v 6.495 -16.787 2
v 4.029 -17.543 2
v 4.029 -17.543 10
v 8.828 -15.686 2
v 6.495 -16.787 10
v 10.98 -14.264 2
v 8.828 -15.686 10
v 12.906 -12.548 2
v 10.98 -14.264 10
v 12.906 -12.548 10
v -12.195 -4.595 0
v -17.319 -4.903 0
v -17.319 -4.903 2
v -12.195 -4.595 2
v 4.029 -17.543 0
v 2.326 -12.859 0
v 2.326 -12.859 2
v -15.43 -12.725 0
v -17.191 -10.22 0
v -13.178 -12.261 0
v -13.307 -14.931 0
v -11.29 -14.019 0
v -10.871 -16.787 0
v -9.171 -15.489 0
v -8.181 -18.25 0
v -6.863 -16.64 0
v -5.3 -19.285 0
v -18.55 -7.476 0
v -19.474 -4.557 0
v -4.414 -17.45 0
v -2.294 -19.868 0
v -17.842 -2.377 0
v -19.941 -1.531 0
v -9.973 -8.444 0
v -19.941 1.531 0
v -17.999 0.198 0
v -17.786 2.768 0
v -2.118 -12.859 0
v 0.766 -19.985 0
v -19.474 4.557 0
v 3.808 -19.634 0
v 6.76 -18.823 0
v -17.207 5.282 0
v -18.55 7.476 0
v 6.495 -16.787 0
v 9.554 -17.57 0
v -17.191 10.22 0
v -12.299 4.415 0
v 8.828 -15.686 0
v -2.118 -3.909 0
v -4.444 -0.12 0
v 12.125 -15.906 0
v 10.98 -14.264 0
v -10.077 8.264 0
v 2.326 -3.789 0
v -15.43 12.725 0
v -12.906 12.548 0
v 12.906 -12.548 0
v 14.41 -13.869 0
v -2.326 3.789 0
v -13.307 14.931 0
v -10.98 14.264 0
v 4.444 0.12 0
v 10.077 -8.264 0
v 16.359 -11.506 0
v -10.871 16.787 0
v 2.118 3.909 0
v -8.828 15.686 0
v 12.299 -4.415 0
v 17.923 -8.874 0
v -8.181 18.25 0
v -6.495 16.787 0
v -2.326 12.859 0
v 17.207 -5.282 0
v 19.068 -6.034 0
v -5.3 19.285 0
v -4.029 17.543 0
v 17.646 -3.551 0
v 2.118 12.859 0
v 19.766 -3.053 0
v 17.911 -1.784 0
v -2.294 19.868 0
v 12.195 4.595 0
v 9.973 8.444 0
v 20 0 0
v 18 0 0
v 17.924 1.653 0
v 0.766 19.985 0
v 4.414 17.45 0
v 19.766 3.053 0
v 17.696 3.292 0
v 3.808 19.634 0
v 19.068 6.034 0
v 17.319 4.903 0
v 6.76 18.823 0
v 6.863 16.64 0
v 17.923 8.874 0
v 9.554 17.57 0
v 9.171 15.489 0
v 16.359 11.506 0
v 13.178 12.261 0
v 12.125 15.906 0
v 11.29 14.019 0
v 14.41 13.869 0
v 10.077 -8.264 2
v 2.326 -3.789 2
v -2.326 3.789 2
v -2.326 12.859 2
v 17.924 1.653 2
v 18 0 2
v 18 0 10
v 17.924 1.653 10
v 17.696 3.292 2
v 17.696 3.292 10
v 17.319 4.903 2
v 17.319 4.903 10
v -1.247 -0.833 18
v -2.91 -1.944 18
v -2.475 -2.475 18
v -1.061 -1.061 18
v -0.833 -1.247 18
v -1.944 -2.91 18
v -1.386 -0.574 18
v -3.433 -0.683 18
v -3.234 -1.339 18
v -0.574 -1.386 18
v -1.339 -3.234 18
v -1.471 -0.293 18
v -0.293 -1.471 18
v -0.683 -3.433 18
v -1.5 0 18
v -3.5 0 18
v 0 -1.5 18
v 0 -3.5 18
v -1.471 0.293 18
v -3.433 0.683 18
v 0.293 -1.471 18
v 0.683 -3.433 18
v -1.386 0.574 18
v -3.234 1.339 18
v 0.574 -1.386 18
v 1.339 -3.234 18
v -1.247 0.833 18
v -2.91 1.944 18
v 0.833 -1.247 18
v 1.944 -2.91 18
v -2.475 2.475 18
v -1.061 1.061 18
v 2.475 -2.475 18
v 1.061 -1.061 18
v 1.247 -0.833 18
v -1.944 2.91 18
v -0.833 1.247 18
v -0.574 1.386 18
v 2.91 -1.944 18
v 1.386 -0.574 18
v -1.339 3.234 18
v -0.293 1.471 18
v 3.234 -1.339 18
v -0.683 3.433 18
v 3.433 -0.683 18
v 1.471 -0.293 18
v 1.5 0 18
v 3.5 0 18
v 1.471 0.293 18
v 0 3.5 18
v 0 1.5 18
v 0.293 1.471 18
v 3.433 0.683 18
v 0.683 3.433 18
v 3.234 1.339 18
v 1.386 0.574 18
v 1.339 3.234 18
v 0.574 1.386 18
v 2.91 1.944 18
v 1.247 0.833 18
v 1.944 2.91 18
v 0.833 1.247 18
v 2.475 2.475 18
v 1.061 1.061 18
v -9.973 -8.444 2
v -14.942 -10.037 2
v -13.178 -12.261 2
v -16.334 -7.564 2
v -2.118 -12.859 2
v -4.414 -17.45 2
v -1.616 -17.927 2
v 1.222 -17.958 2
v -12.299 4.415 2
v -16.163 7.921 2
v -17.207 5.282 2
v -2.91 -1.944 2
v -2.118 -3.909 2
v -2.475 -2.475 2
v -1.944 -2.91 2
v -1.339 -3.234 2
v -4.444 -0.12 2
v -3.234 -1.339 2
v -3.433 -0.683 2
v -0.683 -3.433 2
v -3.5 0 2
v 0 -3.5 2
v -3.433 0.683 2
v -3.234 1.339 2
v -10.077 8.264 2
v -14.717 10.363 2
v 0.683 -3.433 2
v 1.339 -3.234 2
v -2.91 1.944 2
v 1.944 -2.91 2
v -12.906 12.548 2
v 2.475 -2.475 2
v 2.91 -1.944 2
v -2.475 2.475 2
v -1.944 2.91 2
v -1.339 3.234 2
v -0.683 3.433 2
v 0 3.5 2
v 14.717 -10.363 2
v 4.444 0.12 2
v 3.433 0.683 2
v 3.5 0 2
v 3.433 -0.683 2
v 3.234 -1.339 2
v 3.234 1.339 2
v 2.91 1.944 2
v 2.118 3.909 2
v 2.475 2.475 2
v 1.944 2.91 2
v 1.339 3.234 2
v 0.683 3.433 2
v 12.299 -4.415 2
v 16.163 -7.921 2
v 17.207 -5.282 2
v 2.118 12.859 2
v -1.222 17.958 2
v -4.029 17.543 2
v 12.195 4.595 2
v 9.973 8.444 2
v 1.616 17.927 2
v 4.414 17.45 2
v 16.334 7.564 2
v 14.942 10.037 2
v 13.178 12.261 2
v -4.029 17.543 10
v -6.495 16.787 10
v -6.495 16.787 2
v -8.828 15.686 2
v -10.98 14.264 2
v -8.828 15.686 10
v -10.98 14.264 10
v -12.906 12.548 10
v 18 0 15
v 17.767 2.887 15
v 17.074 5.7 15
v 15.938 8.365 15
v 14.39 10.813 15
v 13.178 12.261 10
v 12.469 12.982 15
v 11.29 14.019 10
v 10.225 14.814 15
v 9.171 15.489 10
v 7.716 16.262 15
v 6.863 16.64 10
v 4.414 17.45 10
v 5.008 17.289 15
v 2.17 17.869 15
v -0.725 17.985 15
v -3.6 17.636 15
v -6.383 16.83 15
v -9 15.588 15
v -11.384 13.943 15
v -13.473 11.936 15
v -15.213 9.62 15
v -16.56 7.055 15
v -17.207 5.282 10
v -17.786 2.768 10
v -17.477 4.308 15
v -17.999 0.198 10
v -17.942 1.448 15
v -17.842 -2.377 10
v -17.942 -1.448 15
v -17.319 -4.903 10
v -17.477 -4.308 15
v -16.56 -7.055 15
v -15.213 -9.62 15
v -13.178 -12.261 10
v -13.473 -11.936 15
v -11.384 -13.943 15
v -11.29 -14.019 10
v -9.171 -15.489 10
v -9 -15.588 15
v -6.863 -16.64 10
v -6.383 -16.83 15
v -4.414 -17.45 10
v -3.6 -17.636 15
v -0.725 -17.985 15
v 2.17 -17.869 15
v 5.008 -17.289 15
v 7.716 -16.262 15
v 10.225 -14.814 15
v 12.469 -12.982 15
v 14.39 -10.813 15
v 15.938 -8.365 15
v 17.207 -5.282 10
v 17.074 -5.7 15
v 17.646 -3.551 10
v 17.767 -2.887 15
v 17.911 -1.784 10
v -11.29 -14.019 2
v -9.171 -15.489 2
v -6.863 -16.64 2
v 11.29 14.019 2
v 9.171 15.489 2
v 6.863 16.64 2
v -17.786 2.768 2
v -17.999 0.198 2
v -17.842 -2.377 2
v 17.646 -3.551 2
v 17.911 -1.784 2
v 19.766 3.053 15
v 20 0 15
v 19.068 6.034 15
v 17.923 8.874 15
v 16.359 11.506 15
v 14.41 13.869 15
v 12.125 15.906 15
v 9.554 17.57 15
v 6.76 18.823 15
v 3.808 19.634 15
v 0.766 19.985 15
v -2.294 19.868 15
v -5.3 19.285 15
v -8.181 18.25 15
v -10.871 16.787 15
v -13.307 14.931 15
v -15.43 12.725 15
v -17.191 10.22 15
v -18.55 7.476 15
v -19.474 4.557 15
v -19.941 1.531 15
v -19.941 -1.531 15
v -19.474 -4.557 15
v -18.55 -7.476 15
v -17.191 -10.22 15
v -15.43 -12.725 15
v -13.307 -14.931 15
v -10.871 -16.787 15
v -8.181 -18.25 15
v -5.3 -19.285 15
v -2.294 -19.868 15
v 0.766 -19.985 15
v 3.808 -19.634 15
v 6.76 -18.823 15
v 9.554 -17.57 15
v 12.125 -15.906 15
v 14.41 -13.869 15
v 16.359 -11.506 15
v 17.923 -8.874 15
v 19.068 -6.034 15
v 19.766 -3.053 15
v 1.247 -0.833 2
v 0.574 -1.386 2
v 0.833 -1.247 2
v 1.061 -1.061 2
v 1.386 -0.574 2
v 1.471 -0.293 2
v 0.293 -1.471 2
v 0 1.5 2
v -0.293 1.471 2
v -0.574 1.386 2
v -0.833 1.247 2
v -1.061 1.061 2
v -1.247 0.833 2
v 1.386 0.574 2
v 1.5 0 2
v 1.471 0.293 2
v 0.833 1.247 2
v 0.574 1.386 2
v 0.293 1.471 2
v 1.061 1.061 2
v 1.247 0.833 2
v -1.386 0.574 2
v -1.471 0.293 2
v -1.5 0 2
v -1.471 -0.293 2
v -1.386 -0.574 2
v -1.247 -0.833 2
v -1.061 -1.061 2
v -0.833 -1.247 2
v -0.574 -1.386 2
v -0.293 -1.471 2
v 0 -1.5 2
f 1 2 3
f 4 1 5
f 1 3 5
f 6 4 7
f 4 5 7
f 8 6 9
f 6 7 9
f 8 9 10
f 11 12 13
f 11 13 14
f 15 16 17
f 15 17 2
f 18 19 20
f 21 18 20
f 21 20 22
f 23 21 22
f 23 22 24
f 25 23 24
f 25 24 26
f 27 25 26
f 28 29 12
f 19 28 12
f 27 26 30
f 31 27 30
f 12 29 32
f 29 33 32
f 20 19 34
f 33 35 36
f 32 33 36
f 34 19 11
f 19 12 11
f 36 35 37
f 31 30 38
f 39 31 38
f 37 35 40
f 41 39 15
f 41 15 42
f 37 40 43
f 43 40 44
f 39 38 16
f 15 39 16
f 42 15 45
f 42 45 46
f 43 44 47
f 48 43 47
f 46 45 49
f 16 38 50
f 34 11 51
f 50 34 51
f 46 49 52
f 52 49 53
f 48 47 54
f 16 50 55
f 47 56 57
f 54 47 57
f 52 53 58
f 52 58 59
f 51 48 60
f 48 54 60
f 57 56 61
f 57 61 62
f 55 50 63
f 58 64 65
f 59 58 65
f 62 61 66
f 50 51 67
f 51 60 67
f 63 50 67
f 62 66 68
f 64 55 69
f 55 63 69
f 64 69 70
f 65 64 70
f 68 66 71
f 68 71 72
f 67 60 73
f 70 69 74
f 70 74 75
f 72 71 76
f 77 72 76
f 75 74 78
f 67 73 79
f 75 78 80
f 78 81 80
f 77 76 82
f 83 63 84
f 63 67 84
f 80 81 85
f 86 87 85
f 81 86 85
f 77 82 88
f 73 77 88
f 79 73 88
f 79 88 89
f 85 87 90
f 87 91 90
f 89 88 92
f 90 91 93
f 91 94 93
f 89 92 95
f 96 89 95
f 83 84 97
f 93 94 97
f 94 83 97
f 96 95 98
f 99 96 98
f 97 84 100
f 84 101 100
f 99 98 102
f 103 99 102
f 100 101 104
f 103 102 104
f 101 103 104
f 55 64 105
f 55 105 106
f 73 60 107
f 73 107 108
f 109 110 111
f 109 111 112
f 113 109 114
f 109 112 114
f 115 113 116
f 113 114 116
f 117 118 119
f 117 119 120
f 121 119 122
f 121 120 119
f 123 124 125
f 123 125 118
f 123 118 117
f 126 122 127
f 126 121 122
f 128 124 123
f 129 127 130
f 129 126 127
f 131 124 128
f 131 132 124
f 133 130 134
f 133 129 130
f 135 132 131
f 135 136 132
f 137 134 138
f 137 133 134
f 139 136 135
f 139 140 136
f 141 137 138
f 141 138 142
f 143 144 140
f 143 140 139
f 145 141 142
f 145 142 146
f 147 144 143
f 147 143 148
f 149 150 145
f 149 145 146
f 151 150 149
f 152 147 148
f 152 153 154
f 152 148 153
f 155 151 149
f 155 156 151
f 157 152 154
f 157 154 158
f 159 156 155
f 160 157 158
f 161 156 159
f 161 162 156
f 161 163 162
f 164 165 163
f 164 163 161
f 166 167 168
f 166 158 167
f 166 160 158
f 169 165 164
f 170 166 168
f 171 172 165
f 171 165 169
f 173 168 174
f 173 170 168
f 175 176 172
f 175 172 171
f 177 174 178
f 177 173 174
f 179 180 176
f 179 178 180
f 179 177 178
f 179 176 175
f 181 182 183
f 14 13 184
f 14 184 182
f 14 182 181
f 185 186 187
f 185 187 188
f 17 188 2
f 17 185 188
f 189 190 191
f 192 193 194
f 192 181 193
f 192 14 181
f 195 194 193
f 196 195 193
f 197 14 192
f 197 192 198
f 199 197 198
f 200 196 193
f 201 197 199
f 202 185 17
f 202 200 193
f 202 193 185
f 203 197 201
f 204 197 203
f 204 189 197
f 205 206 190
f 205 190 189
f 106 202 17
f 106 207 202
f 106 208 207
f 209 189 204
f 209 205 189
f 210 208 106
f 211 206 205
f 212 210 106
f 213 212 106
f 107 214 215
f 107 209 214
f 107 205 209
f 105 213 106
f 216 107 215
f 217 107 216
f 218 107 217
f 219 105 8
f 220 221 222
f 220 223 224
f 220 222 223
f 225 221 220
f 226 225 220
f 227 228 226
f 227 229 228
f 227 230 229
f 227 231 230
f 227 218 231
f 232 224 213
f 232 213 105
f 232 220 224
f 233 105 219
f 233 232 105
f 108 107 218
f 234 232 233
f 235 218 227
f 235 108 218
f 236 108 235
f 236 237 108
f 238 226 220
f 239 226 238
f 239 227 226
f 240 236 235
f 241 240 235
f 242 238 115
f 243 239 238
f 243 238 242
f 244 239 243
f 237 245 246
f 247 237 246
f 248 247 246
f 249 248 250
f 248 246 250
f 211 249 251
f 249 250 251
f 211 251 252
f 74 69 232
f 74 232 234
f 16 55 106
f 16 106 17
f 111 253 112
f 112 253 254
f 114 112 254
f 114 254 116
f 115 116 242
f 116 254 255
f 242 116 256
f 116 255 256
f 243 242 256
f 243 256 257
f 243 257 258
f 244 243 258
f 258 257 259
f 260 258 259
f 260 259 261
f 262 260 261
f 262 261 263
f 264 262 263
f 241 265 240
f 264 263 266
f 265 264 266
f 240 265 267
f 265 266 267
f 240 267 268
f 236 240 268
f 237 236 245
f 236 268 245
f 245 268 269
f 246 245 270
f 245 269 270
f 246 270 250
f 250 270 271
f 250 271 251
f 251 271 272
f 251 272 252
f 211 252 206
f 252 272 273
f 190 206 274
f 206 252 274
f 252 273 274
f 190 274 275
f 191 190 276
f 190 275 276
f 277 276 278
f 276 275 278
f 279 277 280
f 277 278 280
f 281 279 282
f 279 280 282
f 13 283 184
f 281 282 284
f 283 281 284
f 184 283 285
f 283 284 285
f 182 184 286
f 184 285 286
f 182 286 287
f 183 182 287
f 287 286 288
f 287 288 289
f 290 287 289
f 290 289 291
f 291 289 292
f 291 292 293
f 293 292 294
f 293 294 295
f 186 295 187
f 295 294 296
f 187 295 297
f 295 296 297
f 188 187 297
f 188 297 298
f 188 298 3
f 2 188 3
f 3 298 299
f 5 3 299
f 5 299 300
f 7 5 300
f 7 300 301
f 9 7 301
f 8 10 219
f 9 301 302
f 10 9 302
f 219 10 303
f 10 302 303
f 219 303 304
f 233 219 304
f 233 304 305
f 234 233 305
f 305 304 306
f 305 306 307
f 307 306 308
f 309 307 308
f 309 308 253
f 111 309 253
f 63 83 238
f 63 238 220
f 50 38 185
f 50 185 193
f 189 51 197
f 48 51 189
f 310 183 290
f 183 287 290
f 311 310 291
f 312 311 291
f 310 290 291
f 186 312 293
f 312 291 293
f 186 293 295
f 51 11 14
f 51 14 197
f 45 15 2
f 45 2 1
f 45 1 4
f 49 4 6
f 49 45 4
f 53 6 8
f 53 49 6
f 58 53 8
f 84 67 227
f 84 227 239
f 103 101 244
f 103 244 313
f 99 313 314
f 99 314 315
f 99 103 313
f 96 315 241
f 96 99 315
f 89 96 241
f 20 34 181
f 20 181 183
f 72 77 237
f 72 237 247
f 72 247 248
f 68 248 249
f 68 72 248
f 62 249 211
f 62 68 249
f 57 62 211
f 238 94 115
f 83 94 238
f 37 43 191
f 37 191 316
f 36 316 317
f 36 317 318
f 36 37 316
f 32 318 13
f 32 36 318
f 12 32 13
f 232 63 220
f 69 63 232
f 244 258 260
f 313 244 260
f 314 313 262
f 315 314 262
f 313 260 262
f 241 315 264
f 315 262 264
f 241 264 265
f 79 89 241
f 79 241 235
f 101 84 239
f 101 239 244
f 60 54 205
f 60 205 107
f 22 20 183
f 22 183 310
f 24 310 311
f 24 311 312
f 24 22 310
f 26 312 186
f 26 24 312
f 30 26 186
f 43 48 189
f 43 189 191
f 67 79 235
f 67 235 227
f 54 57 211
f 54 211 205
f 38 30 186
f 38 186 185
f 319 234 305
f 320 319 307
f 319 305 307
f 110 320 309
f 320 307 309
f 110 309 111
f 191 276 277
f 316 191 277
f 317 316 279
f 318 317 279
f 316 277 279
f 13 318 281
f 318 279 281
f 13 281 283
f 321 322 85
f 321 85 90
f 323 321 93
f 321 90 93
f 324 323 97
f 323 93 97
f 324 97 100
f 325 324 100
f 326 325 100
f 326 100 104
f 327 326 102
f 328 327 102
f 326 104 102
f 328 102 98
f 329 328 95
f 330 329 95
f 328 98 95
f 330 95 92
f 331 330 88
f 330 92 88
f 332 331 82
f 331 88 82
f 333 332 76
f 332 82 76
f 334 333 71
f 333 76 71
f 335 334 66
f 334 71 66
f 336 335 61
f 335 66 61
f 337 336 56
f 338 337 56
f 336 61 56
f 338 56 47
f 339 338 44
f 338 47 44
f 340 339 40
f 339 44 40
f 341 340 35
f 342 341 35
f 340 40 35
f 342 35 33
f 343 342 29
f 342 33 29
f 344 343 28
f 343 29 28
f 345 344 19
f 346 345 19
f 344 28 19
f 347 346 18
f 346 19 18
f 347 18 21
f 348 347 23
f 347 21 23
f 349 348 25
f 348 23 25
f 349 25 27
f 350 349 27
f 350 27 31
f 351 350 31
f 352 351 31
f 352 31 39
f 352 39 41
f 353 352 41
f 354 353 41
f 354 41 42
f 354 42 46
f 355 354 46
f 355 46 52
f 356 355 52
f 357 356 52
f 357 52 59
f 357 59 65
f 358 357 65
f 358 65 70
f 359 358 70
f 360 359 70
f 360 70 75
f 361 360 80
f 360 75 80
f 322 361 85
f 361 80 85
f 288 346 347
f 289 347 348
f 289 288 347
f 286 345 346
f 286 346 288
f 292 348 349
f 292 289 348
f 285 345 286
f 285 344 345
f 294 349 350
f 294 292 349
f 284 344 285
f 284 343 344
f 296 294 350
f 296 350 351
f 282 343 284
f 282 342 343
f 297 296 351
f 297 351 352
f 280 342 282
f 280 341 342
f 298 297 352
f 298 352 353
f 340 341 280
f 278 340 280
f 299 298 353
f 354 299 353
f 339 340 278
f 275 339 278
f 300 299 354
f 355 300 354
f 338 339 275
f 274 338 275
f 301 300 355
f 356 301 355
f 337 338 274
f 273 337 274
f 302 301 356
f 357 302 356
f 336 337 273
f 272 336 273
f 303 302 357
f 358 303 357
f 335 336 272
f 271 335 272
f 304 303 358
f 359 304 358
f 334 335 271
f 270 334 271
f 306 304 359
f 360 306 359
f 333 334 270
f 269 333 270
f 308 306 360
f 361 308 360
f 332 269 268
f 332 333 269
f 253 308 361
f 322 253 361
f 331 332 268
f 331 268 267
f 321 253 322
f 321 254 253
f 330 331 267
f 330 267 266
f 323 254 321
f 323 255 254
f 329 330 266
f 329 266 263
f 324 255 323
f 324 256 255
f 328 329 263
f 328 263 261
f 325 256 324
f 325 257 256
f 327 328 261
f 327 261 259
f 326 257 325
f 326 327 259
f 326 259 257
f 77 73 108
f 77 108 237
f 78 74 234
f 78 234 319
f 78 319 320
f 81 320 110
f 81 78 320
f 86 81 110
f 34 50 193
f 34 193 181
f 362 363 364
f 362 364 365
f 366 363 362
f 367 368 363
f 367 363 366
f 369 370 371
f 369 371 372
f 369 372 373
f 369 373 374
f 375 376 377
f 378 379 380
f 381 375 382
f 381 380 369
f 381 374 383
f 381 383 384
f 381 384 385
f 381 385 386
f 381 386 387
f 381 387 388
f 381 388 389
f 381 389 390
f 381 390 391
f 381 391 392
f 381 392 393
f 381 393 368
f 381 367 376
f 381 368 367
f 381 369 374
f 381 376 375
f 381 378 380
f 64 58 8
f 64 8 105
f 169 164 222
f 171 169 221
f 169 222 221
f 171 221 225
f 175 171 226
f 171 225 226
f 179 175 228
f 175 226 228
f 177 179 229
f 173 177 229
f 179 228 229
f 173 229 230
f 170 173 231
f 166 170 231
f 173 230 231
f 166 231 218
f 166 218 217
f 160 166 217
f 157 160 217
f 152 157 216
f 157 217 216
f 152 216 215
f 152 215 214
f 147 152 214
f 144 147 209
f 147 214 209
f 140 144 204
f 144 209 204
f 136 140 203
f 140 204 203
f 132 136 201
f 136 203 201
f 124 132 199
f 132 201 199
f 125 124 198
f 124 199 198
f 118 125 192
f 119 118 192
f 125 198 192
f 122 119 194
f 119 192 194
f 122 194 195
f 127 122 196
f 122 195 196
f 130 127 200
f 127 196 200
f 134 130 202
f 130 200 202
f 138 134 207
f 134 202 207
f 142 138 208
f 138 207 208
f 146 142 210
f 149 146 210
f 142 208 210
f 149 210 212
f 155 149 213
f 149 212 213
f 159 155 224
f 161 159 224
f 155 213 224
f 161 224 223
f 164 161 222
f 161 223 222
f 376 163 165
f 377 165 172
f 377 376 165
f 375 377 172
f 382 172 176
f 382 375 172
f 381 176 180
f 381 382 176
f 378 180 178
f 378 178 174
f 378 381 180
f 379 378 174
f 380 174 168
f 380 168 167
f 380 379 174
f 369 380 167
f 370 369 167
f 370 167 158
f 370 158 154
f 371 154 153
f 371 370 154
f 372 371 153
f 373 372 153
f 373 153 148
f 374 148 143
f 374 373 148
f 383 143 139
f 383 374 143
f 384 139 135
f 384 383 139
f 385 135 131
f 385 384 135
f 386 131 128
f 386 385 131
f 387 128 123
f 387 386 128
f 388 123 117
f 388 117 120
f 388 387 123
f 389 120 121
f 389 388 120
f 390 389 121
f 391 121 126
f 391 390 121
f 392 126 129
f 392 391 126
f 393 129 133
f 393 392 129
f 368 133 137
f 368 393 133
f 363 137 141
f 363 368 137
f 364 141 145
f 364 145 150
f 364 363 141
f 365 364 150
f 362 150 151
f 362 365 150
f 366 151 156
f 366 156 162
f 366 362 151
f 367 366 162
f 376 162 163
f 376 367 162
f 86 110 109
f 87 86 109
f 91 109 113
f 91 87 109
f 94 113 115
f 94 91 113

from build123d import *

# Parameters (mm, degrees)
F0_R     = 20
F1_DEPTH = 15
F2_R     = 18
F3_DEPTH = 13
F4_R     = 3.5
F4_R_2   = 1.5
F5_DEPTH = 16
F8_DEPTH = 10


with BuildPart() as f1:
    # F0 (on Top) → F1 (new body)
    with BuildSketch(Plane.XY):
        Circle(F0_R)
    extrude(amount=F1_DEPTH)

    # F2 (on face) → F3 (cut)
    with BuildSketch(Plane.XY.offset(15)):
        Circle(F2_R)
    extrude(amount=-F3_DEPTH, mode=Mode.SUBTRACT)

    # F4 (on face) → F5 (join)
    with BuildSketch(Plane.XY.offset(2)):
        Circle(F4_R)
        Circle(F4_R_2, mode=Mode.SUBTRACT)
    extrude(amount=F5_DEPTH)

    # F7 (on face) → F8 (cut)
    with BuildSketch(Plane.XY):
        with BuildLine():
            Line((10.0770842302, -8.2639499676), (2.3258358706, -3.7887646407))
            Line((2.3258358706, -3.7887646407), (2.3258358706, -12.8589859232))
            Line((2.3258358706, -12.8589859232), (4.0292034895, -17.5432471122))
            ThreePointArc((4.0292034895, -17.5432471122), (8.8280697184, -15.6864650271), (12.9055203458, -12.5478103509))
            Line((12.9055203458, -12.5478103509), (10.0770842302, -8.2639499676))
        make_face()
        with BuildLine():
            Line((-2.1182484925, -12.8589859232), (-2.1182484925, -3.9086152693))
            Line((-2.1182484925, -3.9086152693), (-9.9732905411, -8.4437259106))
            Line((-9.9732905411, -8.4437259106), (-13.1782959193, -12.261016135))
            ThreePointArc((-13.1782959193, -12.261016135), (-9.1708423498, -15.4885651561), (-4.4139623529, -17.450413644))
            Line((-4.4139623529, -17.450413644), (-2.1182484925, -12.8589859232))
        make_face()
        with BuildLine():
            Line((-12.1953327227, -4.5950359556), (-4.4440843631, -0.1198506286))
            Line((-4.4440843631, -0.1198506286), (-12.2991264117, 4.4152600127))
            Line((-12.2991264117, 4.4152600127), (-17.2074994088, 5.2822309772))
            ThreePointArc((-17.2074994088, 5.2822309772), (-17.9989120683, 0.197899871), (-17.3194826987, -4.9026032931))
            Line((-17.3194826987, -4.9026032931), (-12.1953327227, -4.5950359556))
        make_face()
        with BuildLine():
            Line((-10.0770842302, 8.2639499676), (-2.3258358706, 3.7887646407))
            Line((-2.3258358706, 3.7887646407), (-2.3258358706, 12.8589859232))
            Line((-2.3258358706, 12.8589859232), (-4.0292034895, 17.5432471122))
            ThreePointArc((-4.0292034895, 17.5432471122), (-8.8280697184, 15.6864650271), (-12.9055203458, 12.5478103509))
            Line((-12.9055203458, 12.5478103509), (-10.0770842302, 8.2639499676))
        make_face()
        with BuildLine():
            Line((2.1182484925, 12.8589859232), (2.1182484925, 3.9086152693))
            Line((2.1182484925, 3.9086152693), (9.9732905411, 8.4437259106))
            Line((9.9732905411, 8.4437259106), (13.1782959193, 12.261016135))
            ThreePointArc((13.1782959193, 12.261016135), (9.1708423498, 15.4885651561), (4.4139623529, 17.450413644))
            Line((4.4139623529, 17.450413644), (2.1182484925, 12.8589859232))
        make_face()
        with BuildLine():
            Line((12.1953327227, 4.5950359556), (4.4440843631, 0.1198506286))
            Line((4.4440843631, 0.1198506286), (12.2991264117, -4.4152600127))
            Line((12.2991264117, -4.4152600127), (17.2074994088, -5.2822309772))
            ThreePointArc((17.2074994088, -5.2822309772), (17.8007723057, -2.6706750684), (18, 0))
            ThreePointArc((18, 0), (17.8290589849, 2.4748041764), (17.3194826987, 4.9026032931))
            Line((17.3194826987, 4.9026032931), (12.1953327227, 4.5950359556))
        make_face()
    extrude(amount=F8_DEPTH, mode=Mode.SUBTRACT)


solid = f1.part
